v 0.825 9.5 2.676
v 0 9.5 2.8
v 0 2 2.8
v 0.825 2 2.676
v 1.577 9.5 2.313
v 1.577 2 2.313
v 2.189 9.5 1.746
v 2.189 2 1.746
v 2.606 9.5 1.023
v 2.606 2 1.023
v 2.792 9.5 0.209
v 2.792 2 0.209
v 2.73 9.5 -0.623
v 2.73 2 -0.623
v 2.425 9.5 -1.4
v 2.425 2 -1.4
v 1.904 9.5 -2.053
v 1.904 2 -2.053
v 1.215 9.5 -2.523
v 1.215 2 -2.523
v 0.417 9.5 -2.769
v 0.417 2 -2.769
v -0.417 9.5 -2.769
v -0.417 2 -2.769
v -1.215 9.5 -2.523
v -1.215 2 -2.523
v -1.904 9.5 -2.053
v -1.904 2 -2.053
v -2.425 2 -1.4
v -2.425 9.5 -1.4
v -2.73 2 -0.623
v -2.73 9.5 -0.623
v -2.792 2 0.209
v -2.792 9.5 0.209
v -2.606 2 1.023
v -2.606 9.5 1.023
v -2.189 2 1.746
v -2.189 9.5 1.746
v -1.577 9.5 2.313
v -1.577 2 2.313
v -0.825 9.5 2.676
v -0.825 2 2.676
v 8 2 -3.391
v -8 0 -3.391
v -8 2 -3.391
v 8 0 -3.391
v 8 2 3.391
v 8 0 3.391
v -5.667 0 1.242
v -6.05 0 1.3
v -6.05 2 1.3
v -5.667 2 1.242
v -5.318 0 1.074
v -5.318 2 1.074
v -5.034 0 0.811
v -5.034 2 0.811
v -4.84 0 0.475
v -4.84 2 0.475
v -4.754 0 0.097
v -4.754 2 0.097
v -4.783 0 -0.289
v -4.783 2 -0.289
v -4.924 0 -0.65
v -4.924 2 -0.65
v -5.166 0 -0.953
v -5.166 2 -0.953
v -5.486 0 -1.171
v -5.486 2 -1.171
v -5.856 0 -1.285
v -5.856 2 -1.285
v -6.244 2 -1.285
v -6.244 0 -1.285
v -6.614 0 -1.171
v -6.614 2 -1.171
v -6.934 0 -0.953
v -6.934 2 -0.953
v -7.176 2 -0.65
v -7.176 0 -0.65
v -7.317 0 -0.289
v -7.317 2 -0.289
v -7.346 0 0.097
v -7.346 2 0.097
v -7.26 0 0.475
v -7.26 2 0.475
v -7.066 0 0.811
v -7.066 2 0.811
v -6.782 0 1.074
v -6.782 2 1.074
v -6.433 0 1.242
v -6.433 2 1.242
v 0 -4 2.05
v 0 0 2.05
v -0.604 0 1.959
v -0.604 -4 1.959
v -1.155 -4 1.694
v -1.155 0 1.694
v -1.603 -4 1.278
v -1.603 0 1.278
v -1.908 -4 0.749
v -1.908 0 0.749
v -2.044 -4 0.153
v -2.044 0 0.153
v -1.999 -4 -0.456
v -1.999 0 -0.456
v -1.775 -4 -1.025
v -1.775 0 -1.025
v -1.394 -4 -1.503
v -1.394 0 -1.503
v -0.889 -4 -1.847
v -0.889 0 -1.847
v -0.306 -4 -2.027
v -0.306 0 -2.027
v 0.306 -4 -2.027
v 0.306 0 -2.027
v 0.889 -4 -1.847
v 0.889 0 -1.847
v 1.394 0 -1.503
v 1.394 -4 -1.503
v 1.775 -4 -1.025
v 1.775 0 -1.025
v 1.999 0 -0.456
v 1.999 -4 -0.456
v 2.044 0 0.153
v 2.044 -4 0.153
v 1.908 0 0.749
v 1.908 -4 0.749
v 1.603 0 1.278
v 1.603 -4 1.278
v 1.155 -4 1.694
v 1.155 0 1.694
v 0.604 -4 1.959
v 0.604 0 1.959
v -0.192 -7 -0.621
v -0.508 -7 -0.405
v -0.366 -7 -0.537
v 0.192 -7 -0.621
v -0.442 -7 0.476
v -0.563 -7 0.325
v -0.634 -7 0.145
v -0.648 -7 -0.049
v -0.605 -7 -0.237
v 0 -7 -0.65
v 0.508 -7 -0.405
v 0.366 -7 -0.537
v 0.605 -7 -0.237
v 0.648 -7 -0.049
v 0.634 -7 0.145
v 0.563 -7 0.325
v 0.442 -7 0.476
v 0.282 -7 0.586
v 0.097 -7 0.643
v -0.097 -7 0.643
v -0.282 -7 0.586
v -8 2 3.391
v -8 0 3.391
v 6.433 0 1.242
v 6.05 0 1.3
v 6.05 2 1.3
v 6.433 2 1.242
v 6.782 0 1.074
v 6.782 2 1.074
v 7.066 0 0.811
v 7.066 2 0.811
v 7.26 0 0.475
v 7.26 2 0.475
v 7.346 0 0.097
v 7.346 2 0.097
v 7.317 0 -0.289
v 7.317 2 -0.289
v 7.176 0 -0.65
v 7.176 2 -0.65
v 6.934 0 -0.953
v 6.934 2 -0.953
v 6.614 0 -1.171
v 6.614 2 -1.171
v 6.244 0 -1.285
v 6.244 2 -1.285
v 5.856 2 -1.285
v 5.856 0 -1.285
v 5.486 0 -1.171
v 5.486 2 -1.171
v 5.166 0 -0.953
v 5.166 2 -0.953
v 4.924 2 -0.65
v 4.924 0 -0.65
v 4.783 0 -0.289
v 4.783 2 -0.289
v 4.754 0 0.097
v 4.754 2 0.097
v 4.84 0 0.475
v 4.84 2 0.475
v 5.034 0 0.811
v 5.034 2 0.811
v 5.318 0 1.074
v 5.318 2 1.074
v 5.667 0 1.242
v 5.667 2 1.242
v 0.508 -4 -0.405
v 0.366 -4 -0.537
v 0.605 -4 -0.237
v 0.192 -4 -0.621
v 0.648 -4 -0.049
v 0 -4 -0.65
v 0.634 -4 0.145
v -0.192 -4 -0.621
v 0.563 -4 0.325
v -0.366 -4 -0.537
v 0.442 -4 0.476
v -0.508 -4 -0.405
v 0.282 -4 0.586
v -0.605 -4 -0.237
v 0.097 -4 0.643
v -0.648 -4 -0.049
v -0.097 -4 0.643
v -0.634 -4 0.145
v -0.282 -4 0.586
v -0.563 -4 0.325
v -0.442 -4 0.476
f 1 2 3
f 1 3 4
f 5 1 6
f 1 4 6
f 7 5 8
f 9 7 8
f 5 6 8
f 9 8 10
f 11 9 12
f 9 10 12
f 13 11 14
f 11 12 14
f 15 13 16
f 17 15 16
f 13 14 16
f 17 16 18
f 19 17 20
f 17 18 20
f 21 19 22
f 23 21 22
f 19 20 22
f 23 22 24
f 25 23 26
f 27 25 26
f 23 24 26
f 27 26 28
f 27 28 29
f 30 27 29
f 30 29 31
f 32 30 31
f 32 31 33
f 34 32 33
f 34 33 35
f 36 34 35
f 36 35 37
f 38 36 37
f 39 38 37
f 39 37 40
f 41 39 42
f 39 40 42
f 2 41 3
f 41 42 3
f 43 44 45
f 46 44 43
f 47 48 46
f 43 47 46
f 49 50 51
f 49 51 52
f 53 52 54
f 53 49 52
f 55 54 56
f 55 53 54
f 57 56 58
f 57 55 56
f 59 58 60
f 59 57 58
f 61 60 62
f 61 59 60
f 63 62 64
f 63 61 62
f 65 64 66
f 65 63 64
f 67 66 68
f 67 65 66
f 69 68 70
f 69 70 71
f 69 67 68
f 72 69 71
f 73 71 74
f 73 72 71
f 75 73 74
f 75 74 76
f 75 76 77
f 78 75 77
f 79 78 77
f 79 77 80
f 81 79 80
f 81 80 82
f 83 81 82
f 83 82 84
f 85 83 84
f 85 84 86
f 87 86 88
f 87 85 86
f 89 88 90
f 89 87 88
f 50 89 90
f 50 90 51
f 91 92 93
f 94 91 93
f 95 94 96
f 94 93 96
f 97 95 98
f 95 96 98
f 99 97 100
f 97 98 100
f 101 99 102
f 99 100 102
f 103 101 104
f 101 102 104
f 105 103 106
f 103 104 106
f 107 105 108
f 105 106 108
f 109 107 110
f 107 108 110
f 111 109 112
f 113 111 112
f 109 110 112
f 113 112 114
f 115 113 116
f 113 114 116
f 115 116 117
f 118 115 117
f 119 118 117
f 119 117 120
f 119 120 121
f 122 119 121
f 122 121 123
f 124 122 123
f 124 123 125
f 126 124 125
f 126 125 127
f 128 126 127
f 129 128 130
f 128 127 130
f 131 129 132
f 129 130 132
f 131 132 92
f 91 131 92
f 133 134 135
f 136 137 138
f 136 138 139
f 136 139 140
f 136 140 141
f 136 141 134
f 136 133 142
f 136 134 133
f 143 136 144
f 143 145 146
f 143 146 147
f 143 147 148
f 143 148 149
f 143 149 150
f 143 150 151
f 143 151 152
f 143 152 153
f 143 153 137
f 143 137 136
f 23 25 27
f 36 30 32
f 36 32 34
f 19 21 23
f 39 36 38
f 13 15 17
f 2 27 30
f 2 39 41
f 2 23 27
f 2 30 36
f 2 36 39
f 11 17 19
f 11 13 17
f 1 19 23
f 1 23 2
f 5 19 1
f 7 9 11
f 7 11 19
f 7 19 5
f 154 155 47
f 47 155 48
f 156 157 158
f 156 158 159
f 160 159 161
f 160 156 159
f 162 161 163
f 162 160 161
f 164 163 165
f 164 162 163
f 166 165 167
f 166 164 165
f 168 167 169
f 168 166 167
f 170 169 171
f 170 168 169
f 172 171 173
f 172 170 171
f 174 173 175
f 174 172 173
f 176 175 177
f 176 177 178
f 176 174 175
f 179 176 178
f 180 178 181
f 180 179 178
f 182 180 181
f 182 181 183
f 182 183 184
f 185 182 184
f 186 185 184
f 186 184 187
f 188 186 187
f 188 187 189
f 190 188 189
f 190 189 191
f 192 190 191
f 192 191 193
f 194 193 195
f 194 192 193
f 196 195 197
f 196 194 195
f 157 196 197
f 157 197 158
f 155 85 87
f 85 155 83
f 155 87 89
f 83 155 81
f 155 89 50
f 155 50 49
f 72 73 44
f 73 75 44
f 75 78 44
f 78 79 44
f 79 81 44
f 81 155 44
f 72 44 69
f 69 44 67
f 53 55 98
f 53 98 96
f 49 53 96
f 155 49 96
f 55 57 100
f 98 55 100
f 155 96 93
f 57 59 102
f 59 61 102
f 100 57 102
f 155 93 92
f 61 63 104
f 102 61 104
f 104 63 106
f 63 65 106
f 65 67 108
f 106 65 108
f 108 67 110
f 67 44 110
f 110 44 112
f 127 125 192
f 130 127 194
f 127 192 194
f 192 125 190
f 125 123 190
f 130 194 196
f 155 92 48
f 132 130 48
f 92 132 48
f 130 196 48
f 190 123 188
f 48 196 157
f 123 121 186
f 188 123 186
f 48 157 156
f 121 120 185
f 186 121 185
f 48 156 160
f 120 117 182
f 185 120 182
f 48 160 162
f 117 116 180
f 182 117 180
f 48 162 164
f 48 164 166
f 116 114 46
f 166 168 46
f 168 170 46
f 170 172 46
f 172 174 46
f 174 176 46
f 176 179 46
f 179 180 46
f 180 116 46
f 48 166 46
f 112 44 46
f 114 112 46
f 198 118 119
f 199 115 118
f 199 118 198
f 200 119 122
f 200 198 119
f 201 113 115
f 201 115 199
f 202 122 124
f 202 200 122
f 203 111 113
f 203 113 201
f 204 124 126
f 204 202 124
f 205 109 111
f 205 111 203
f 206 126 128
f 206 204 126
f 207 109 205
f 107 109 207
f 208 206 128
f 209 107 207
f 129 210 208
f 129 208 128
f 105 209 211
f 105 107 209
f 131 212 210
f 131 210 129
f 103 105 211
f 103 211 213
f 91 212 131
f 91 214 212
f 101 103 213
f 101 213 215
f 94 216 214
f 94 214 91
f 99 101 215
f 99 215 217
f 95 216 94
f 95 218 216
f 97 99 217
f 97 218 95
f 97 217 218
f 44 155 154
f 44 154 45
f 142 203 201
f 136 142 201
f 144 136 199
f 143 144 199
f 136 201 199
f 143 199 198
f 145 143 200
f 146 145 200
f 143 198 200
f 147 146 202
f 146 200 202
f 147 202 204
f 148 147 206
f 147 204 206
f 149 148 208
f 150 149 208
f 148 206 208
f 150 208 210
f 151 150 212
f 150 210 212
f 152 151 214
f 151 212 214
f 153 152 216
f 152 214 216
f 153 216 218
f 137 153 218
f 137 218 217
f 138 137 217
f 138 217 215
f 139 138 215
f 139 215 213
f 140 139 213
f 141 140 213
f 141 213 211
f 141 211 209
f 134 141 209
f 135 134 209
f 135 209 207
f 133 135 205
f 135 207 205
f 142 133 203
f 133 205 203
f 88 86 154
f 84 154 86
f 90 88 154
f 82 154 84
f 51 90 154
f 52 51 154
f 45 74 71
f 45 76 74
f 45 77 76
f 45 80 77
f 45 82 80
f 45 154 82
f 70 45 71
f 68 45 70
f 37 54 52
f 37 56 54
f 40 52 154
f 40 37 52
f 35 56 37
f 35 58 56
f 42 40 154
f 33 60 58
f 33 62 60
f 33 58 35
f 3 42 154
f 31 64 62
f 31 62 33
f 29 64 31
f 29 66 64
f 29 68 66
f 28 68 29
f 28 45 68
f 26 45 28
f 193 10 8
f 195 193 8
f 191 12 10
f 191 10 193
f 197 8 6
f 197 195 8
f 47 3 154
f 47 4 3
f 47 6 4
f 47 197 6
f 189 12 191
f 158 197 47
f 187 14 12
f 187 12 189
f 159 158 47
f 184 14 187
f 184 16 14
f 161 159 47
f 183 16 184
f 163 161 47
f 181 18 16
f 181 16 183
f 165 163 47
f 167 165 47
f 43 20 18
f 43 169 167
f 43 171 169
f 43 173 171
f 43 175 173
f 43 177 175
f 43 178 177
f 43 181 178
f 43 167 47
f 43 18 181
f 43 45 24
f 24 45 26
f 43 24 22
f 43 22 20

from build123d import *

# Parameters (mm, degrees)
SKETCH_1_W      = 16
SKETCH_1_H      = 6.782608696
SKETCH_1_R      = 1.3
EXTRUDE_1_DEPTH = 2
SKETCH_2_R      = 2.8
EXTRUDE_2_DEPTH = 7.5
SKETCH_3_R      = 2.05
EXTRUDE_3_DEPTH = 4
SKETCH_4_R      = 0.65
EXTRUDE_4_DEPTH = 3


with BuildPart() as part:
    # 草图1 → 凸台-拉伸1 (new body)
    with BuildSketch(Plane(origin=(0, 0, 0), x_dir=(1, 0, 0), z_dir=(0, 1, 0))):
        Rectangle(SKETCH_1_W, SKETCH_1_H)
        with Locations(Location((-6.05, 0, 0), (0, 0, 270))):
            Circle(SKETCH_1_R, mode=Mode.SUBTRACT)
        with Locations(Location((6.05, 0, 0), (0, 0, 270))):
            Circle(SKETCH_1_R, mode=Mode.SUBTRACT)
    extrude(amount=EXTRUDE_1_DEPTH)

    # 草图2 → 凸台-拉伸2 (add)
    with BuildSketch(Plane(origin=(0, 2, 0), x_dir=(1, 0, 0), z_dir=(0, 1, 0))):
        with Locations(Location((0, 0, 0), (0, 0, 270))):
            Circle(SKETCH_2_R)
    extrude(amount=EXTRUDE_2_DEPTH)

    # 草图3 → 凸台-拉伸3 (add)
    with BuildSketch(Plane.XZ):
        with Locations(Location((0, 0, 0), (0, 0, 90))):
            Circle(SKETCH_3_R)
    extrude(amount=EXTRUDE_3_DEPTH)

    # 草图4 → 凸台-拉伸4 (add)
    with BuildSketch(Plane.XZ.offset(4)):
        with Locations(Location((0, 0, 0), (0, 0, 270))):
            Circle(SKETCH_4_R)
    extrude(amount=EXTRUDE_4_DEPTH)


solid = part.part
